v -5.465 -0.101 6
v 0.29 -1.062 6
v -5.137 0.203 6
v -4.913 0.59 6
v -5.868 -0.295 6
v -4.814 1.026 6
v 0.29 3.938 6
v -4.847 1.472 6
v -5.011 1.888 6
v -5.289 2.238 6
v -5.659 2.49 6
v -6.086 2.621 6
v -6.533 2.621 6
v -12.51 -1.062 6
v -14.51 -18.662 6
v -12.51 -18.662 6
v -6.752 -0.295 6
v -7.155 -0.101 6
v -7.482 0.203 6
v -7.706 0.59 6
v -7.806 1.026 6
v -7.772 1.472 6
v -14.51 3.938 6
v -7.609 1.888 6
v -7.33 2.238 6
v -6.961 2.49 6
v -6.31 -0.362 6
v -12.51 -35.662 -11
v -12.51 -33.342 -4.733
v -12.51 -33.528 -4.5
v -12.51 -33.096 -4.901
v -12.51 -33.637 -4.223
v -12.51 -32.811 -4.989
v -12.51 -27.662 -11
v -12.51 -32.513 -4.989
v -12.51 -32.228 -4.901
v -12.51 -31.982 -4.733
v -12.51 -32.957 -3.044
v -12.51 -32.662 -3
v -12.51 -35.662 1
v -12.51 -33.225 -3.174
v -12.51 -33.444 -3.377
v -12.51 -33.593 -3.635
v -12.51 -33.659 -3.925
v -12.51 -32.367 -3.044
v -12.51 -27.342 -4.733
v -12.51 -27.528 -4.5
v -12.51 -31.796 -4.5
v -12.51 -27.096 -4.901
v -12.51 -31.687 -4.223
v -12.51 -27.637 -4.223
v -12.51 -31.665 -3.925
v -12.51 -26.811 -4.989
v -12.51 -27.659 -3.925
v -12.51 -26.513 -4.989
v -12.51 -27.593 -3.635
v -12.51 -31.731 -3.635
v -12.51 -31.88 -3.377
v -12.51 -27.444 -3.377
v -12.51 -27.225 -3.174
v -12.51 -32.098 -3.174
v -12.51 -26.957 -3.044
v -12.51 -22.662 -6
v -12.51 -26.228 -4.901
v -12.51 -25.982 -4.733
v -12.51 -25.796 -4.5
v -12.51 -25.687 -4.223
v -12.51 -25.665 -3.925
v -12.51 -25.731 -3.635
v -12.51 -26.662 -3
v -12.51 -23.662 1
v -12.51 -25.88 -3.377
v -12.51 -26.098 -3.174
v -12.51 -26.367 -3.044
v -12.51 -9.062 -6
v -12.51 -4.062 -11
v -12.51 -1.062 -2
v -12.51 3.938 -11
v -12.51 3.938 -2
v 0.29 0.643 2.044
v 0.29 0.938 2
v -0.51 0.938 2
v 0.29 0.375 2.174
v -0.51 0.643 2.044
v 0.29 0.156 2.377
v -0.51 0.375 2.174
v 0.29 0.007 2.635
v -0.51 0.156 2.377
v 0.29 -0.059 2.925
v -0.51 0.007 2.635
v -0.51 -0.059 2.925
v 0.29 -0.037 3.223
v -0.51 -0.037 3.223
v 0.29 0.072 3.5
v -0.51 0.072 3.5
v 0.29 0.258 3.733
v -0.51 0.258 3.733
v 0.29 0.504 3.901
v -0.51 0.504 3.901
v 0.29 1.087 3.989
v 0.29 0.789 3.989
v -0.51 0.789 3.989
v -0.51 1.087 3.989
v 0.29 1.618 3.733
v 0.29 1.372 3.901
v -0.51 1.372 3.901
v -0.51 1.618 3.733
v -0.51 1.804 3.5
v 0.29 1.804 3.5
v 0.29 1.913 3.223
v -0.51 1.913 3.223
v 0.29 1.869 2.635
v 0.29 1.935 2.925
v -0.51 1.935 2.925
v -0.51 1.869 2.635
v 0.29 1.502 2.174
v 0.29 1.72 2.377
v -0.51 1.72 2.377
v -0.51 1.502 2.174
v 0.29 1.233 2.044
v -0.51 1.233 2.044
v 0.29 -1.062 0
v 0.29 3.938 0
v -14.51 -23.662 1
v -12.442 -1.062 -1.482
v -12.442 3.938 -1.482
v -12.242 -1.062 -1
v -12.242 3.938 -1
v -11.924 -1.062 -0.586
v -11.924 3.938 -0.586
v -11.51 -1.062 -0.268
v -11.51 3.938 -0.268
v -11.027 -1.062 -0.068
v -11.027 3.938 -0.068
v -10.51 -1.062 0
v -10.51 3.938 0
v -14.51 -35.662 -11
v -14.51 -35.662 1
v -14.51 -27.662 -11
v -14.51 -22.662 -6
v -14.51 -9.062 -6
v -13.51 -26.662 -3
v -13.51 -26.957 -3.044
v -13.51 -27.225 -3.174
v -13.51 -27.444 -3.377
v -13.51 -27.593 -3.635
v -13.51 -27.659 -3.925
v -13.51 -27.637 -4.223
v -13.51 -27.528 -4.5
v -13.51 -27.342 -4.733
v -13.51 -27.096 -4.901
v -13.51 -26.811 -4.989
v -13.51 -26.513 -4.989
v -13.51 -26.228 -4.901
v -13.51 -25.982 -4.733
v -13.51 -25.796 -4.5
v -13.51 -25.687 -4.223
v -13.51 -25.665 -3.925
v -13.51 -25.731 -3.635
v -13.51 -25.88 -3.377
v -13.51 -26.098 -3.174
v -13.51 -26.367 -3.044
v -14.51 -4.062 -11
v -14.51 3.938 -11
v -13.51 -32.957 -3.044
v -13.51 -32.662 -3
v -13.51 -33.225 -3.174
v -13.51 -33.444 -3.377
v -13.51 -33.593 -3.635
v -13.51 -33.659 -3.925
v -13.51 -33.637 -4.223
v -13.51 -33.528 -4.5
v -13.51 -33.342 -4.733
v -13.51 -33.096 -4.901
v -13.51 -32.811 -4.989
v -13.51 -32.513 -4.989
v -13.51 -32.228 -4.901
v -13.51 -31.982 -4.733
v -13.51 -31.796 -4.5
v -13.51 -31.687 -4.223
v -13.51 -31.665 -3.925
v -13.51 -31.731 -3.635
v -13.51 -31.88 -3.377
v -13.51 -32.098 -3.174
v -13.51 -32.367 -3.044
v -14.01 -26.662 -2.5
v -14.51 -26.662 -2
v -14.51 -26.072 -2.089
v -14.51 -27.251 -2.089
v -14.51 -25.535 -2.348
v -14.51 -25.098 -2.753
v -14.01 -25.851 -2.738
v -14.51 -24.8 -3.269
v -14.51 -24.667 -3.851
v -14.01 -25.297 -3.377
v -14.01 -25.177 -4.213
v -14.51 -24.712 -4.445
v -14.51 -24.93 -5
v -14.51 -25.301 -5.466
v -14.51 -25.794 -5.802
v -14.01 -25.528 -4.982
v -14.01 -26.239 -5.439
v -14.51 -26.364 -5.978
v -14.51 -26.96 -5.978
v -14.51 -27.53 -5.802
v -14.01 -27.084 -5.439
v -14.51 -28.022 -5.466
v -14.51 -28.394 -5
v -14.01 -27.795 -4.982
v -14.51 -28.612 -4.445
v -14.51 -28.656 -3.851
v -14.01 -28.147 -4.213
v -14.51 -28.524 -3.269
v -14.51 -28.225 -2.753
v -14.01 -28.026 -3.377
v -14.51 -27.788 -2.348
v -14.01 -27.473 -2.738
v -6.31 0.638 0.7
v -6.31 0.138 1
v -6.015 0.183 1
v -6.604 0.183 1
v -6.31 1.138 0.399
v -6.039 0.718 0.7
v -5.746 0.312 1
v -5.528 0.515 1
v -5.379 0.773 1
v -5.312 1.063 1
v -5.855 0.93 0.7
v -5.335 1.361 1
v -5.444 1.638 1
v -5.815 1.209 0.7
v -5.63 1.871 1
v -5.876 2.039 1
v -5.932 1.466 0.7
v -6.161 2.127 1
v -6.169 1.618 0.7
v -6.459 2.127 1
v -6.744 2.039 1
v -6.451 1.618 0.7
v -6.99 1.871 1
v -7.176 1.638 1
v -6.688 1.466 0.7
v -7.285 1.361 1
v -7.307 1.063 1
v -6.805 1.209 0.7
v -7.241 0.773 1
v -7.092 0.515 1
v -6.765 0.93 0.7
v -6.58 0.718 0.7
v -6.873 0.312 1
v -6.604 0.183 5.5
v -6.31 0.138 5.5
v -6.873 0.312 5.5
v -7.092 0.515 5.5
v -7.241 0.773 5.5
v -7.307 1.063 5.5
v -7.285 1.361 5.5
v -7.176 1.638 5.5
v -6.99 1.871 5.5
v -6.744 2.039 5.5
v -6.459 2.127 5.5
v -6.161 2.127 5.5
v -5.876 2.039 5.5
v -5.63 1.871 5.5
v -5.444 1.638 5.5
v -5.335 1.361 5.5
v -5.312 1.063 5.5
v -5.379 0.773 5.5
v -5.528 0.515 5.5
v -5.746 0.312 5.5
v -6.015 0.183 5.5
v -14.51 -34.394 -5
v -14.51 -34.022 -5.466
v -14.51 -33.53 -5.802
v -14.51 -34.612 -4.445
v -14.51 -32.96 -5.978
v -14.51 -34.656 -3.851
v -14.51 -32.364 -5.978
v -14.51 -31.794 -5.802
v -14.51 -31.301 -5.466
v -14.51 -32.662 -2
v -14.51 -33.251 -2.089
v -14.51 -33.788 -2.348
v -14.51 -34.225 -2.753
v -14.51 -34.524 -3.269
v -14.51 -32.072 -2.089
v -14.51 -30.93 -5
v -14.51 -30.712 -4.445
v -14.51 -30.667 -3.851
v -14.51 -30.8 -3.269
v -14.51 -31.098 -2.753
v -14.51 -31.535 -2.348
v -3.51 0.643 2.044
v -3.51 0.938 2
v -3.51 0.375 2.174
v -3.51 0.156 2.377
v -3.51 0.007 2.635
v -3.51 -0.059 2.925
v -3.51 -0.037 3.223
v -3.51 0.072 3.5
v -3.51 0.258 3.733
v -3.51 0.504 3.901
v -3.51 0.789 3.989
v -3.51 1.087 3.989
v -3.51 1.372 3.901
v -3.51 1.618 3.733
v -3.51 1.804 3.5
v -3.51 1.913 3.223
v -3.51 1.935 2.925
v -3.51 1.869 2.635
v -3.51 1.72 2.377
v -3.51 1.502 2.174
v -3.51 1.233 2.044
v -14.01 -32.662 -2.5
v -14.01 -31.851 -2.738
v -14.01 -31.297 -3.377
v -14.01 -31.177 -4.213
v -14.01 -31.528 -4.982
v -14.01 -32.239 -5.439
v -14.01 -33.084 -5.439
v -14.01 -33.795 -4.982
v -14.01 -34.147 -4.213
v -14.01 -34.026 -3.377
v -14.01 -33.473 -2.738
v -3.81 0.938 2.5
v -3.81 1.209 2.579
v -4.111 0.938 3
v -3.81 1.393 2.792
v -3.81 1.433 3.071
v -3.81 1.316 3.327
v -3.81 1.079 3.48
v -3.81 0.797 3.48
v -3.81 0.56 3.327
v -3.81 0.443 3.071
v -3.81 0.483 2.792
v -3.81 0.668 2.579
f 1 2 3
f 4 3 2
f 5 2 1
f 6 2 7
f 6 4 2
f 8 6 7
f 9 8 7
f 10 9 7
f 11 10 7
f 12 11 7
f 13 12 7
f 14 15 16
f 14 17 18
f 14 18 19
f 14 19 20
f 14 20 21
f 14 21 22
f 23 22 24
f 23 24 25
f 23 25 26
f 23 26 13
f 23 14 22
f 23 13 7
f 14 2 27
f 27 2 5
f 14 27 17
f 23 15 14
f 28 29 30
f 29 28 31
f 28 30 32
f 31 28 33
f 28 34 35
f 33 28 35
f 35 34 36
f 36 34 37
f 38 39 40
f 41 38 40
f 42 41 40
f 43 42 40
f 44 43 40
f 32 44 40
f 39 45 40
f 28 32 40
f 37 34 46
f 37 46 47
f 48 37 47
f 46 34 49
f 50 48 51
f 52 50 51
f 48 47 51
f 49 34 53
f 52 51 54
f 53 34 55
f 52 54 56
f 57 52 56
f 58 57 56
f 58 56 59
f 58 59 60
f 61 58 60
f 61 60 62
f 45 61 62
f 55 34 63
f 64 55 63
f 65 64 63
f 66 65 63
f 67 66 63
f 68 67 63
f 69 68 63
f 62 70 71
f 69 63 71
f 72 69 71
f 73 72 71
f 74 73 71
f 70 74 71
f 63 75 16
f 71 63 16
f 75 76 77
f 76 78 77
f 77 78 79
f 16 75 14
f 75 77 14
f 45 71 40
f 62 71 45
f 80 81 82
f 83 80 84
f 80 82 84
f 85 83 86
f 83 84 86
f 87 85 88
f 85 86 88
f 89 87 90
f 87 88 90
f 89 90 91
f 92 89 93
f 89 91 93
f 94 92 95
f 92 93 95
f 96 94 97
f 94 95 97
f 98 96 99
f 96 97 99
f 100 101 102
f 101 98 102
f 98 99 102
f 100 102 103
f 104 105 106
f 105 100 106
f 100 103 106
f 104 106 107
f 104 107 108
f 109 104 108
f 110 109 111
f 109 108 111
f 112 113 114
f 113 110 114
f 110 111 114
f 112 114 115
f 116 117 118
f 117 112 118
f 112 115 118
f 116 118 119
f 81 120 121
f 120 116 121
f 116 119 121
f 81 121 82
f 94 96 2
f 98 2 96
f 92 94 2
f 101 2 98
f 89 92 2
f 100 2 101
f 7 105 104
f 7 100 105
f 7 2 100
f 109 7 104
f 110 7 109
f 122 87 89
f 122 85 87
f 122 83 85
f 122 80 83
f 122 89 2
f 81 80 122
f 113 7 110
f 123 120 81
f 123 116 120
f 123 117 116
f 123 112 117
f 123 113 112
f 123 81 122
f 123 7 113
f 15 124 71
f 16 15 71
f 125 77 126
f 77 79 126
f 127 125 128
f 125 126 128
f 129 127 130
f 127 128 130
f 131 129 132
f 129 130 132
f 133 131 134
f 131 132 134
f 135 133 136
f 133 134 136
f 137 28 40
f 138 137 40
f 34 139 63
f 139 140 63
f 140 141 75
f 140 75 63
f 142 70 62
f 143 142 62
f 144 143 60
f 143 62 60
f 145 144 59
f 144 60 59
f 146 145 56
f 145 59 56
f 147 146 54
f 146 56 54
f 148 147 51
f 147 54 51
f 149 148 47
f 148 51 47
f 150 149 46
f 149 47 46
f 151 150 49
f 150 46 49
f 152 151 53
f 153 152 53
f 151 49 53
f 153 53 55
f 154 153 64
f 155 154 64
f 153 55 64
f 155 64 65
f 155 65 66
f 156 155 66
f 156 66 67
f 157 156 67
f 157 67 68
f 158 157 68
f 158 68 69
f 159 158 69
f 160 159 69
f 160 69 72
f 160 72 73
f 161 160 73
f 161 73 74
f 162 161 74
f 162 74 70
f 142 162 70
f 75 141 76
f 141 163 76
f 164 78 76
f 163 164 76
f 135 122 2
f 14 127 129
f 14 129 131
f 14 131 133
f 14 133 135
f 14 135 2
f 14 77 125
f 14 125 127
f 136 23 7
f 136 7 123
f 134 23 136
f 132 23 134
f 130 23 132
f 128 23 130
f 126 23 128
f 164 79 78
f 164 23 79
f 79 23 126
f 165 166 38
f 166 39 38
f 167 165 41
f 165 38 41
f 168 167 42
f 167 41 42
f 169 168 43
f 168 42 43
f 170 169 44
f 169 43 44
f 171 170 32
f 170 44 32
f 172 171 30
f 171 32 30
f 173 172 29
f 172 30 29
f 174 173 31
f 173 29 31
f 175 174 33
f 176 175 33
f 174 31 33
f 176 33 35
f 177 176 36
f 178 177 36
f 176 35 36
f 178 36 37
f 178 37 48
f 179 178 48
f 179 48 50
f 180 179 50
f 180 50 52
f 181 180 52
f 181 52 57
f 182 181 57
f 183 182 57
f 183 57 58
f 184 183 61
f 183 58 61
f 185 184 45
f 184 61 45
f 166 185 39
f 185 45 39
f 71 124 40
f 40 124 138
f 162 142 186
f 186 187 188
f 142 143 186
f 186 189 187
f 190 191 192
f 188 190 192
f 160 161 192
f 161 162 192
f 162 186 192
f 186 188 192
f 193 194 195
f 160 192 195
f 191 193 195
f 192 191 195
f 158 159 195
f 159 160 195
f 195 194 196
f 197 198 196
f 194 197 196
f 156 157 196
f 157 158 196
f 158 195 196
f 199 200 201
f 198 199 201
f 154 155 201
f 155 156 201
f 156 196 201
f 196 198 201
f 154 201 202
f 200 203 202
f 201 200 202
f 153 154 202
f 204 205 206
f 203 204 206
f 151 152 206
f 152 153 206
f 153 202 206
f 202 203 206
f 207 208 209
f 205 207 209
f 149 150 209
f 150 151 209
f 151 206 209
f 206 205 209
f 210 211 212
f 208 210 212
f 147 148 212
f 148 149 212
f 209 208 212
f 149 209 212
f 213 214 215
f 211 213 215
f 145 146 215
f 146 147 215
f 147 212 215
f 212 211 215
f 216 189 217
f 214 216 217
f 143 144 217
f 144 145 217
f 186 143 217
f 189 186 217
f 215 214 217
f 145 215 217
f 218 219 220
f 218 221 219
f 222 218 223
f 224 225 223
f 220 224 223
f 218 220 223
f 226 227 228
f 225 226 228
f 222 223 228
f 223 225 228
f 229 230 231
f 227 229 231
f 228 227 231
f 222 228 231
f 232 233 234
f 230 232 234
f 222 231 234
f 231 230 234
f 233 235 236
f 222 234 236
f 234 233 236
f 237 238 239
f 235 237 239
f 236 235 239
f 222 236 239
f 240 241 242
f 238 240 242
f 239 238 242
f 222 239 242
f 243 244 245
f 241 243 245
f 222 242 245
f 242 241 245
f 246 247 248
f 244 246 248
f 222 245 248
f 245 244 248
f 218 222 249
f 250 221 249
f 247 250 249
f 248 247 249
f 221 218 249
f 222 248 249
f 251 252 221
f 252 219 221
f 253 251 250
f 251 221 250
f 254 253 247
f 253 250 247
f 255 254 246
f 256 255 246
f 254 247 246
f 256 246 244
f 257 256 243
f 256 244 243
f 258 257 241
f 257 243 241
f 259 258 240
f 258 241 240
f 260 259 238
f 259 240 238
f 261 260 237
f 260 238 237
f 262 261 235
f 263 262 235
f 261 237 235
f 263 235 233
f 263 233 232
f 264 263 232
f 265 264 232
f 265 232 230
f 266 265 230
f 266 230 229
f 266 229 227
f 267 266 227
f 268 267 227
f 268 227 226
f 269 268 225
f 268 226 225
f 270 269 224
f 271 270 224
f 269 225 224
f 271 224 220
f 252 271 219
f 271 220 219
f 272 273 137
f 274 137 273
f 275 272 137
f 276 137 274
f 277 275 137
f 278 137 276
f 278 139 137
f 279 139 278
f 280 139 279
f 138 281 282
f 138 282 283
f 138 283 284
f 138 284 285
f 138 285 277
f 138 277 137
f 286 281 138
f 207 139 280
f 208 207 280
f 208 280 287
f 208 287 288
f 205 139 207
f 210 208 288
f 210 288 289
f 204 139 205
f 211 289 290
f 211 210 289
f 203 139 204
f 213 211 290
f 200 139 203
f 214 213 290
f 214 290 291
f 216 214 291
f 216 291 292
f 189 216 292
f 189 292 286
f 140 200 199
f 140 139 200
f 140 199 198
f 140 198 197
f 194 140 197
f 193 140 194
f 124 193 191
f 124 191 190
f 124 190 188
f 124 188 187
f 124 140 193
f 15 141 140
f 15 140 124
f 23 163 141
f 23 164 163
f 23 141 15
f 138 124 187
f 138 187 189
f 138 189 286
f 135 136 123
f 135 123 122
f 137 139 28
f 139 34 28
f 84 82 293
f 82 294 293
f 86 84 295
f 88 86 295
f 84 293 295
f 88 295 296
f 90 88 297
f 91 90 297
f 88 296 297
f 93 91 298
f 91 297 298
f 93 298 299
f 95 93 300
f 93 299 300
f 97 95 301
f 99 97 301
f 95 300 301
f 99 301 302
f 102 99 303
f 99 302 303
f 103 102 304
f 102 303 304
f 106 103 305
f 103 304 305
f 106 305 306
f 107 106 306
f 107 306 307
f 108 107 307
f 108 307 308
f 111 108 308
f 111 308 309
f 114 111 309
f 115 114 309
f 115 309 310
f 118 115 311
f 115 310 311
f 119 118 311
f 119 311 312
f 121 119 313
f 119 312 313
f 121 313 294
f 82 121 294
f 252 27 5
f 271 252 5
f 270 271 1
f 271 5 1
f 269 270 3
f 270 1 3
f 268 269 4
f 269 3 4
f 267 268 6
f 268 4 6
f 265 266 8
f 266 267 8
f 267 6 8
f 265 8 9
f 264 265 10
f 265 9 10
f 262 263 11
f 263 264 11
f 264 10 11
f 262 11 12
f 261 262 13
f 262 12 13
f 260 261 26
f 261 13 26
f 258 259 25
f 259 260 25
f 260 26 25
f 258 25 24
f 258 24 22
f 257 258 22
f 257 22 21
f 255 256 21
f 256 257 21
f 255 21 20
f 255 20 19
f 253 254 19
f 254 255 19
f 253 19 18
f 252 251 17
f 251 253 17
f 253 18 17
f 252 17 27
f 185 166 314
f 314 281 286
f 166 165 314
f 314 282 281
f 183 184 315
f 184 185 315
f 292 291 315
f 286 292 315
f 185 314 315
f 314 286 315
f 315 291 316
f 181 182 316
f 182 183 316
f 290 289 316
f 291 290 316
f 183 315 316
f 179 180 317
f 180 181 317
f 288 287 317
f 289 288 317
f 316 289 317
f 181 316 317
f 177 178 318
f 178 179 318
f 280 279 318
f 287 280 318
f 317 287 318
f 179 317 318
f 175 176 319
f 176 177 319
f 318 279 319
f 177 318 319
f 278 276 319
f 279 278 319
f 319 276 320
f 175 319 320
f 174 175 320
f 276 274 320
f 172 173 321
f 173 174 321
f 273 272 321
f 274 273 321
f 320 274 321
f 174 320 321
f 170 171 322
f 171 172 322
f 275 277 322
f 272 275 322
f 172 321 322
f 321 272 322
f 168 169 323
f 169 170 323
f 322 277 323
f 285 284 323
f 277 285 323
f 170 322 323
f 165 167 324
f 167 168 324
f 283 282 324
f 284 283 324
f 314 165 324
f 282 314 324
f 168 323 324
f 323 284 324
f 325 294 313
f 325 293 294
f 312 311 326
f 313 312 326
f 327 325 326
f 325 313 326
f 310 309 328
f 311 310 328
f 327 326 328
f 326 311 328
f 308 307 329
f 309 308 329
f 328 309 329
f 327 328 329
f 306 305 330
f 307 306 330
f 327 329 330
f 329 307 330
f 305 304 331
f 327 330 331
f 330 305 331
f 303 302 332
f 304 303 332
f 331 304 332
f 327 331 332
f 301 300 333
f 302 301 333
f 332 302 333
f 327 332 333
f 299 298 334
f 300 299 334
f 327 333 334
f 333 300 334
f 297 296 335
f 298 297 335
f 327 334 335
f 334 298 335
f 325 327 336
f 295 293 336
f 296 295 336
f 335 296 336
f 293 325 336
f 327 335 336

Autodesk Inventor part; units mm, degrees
ref_plane "YZ Plane" through (0, 0, 0) normal (1, 0, 0) x (0, 1, 0)
ref_plane "XZ Plane" through (0, 0, 0) normal (0, 1, 0) x (-1, 0, 0)
ref_plane "XY Plane" through (0, 0, 0) normal (0, 0, 1) x (1, 0, 0)
sketch "Sketch1" plane through (0, 0, 0) normal (0, 0, 1) x (1, 0, 0)
  line L0 (-12.5097, 3.9382) -> (-0.5097, 3.9382)
  line L1 (-0.5097, 3.9382) -> (-0.5097, -1.0618)
  line L2 (-0.5097, -1.0618) -> (-12.5097, -1.0618)
  line L3 (-12.5097, -1.0618) -> (-12.5097, 3.9382)
  point P0 (0, 0)
  dimension "d0" = 12
  dimension "d1" = 5
extrude "Extrusion1" add sketch "Sketch1" along normal blind 6
sketch "Sketch2" plane through (0, 0, 6) normal (0, 0, 1) x (1, 0, 0)
  line L0 (-0.5097, -1.0618) -> (-0.5097, 3.9382) projected
  line L1 (-0.5097, 3.9382) -> (-12.5097, 3.9382) projected
  point P0 (0, 0)
  point P1 (-6.3097, 1.1382)
  dimension "d4" = 5.8
  dimension "d5" = 2.8
hole "Hole1" at (-6.3097, 1.1382, 6) direction (0, 0, -1) diameter 2 depth 5 tip angle 118 countersink diameter 3 countersink angle 90
sketch "Sketch3" plane through (-0.5097, -1.0618, 0) normal (1, 0, 0) x (0, 0, -1)
  line L0 (0, 5) -> (-6, 5) projected
  line L1 (-6, 0) -> (-6, 5) projected
  point P0 (0, 1.0618)
  point P1 (-3, 2)
  dimension "d13" = 3
  dimension "d14" = 3
hole "Hole2" at (-0.5097, 0.9382, 3) direction (-1, 0, 0) diameter 2 depth 3 tip angle 118
sketch "Sketch4" plane through (-12.5097, -1.0618, 0) normal (-1, 0, 0) x (0, 0, 1)
  line L0 (6, 0) -> (6, 5) projected
  line L1 (6, 5) -> (-11, 5)
  line L2 (-11, 5) -> (-11, -34.6)
  line L3 (-11, -34.6) -> (6, -34.6)
  line L4 (6, -34.6) -> (6, 5)
  point P0 (0, 1.0618)
  dimension "d22" = 17
  dimension "d23" = 39.6
extrude "Extrusion2" add sketch "Sketch4" along normal blind 2
sketch "Sketch5" plane through (-14.5097, -1.0618, 0) normal (-1, 0, 0) x (0, 0, 1)
  line L0 (-11, -34.6) -> (6, -34.6) projected
  line L1 (6, -34.6) -> (6, 5) projected
  point P0 (0, 1.0618)
  point P1 (-4, -25.6)
  point P2 (-4, -31.6)
  dimension "d26" = 3
  dimension "d27" = 9
  dimension "d28" = 10
  dimension "d29" = 10
hole "Hole3" at (-14.5097, -26.6618, -4) at (-14.5097, -32.6618, -4) direction (1, 0, 0) diameter 2 depth 3 tip angle 118 countersink diameter 4 countersink angle 90
sketch "Sketch6" plane through (-0.5097, -1.0618, 0) normal (1, 0, 0) x (0, 0, -1)
  line L0 (-6, 5) -> (11, 5) projected
  line L1 (0, 5) -> (0, 0) projected
  line L2 (-6, 5) -> (0, 5)
  line L3 (0, 5) -> (0, 0)
  line L4 (0, 0) -> (-6, 0)
  line L5 (-6, 0) -> (-6, 5)
  circle A0 centre (-3, 2) radius 1 projected
  circle A1 centre (-3, 2) radius 1
  point P0 (0, 1.0618)
  dimension "d37" = 2
extrude "Extrusion3" add sketch "Sketch6" along normal blind 0.8
sketch "Sketch7" plane through (-14.5097, -35.6618, 6) normal (-1, 0, 0) x (0, 0, 1)
  line L0 (-17, 39.6) -> (-17, 0) projected
  line L1 (-17, 31.6) -> (-12, 31.6)
  line L2 (-12, 31.6) -> (-12, 8)
  line L3 (-12, 8) -> (-17, 8)
  line L4 (-17, 8) -> (-17, 31.6)
  line L5 (0, 39.6) -> (-17, 39.6) projected
  line L6 (-17, 0) -> (0, 0) projected
  point P0 (-6, 35.6618)
  point P1 (-10, 0)
  point P2 (-17, 8)
  dimension "d40" = 5
  dimension "d41" = 8
  dimension "d42" = 8
extrude "Extrusion4" cut sketch "Sketch7" against normal blind 2
chamfer "Chamfer1" distance 5 angle 45 2 edges at (-13.5097, -4.0618, -6) (-13.5097, -27.6618, -6)
fillet "Fillet1" radius 2 1 edges at (-12.5097, 1.4382, 0)
sketch "Sketch8" plane through (-14.5097, -35.6618, 6) normal (-1, 0, 0) x (0, 0, 1)
  line L0 (0, 0) -> (0, 39.6) projected
  line L1 (-17, 0) -> (0, 0) projected
  line L2 (0, 12) -> (-5, 12)
  line L3 (-5, 12) -> (-5, 0)
  line L4 (-5, 0) -> (0, 0)
  line L5 (0, 0) -> (0, 12)
  point P0 (-6, 35.6618)
  point P1 (-10, 0)
  dimension "d49" = 5
  dimension "d50" = 12
extrude "Extrusion5" cut sketch "Sketch8" against normal blind 10
chamfer "Chamfer2" distance 5 angle 45 1 edges at (-13.5097, -23.6618, 6)
properties part number "servo-mount"
